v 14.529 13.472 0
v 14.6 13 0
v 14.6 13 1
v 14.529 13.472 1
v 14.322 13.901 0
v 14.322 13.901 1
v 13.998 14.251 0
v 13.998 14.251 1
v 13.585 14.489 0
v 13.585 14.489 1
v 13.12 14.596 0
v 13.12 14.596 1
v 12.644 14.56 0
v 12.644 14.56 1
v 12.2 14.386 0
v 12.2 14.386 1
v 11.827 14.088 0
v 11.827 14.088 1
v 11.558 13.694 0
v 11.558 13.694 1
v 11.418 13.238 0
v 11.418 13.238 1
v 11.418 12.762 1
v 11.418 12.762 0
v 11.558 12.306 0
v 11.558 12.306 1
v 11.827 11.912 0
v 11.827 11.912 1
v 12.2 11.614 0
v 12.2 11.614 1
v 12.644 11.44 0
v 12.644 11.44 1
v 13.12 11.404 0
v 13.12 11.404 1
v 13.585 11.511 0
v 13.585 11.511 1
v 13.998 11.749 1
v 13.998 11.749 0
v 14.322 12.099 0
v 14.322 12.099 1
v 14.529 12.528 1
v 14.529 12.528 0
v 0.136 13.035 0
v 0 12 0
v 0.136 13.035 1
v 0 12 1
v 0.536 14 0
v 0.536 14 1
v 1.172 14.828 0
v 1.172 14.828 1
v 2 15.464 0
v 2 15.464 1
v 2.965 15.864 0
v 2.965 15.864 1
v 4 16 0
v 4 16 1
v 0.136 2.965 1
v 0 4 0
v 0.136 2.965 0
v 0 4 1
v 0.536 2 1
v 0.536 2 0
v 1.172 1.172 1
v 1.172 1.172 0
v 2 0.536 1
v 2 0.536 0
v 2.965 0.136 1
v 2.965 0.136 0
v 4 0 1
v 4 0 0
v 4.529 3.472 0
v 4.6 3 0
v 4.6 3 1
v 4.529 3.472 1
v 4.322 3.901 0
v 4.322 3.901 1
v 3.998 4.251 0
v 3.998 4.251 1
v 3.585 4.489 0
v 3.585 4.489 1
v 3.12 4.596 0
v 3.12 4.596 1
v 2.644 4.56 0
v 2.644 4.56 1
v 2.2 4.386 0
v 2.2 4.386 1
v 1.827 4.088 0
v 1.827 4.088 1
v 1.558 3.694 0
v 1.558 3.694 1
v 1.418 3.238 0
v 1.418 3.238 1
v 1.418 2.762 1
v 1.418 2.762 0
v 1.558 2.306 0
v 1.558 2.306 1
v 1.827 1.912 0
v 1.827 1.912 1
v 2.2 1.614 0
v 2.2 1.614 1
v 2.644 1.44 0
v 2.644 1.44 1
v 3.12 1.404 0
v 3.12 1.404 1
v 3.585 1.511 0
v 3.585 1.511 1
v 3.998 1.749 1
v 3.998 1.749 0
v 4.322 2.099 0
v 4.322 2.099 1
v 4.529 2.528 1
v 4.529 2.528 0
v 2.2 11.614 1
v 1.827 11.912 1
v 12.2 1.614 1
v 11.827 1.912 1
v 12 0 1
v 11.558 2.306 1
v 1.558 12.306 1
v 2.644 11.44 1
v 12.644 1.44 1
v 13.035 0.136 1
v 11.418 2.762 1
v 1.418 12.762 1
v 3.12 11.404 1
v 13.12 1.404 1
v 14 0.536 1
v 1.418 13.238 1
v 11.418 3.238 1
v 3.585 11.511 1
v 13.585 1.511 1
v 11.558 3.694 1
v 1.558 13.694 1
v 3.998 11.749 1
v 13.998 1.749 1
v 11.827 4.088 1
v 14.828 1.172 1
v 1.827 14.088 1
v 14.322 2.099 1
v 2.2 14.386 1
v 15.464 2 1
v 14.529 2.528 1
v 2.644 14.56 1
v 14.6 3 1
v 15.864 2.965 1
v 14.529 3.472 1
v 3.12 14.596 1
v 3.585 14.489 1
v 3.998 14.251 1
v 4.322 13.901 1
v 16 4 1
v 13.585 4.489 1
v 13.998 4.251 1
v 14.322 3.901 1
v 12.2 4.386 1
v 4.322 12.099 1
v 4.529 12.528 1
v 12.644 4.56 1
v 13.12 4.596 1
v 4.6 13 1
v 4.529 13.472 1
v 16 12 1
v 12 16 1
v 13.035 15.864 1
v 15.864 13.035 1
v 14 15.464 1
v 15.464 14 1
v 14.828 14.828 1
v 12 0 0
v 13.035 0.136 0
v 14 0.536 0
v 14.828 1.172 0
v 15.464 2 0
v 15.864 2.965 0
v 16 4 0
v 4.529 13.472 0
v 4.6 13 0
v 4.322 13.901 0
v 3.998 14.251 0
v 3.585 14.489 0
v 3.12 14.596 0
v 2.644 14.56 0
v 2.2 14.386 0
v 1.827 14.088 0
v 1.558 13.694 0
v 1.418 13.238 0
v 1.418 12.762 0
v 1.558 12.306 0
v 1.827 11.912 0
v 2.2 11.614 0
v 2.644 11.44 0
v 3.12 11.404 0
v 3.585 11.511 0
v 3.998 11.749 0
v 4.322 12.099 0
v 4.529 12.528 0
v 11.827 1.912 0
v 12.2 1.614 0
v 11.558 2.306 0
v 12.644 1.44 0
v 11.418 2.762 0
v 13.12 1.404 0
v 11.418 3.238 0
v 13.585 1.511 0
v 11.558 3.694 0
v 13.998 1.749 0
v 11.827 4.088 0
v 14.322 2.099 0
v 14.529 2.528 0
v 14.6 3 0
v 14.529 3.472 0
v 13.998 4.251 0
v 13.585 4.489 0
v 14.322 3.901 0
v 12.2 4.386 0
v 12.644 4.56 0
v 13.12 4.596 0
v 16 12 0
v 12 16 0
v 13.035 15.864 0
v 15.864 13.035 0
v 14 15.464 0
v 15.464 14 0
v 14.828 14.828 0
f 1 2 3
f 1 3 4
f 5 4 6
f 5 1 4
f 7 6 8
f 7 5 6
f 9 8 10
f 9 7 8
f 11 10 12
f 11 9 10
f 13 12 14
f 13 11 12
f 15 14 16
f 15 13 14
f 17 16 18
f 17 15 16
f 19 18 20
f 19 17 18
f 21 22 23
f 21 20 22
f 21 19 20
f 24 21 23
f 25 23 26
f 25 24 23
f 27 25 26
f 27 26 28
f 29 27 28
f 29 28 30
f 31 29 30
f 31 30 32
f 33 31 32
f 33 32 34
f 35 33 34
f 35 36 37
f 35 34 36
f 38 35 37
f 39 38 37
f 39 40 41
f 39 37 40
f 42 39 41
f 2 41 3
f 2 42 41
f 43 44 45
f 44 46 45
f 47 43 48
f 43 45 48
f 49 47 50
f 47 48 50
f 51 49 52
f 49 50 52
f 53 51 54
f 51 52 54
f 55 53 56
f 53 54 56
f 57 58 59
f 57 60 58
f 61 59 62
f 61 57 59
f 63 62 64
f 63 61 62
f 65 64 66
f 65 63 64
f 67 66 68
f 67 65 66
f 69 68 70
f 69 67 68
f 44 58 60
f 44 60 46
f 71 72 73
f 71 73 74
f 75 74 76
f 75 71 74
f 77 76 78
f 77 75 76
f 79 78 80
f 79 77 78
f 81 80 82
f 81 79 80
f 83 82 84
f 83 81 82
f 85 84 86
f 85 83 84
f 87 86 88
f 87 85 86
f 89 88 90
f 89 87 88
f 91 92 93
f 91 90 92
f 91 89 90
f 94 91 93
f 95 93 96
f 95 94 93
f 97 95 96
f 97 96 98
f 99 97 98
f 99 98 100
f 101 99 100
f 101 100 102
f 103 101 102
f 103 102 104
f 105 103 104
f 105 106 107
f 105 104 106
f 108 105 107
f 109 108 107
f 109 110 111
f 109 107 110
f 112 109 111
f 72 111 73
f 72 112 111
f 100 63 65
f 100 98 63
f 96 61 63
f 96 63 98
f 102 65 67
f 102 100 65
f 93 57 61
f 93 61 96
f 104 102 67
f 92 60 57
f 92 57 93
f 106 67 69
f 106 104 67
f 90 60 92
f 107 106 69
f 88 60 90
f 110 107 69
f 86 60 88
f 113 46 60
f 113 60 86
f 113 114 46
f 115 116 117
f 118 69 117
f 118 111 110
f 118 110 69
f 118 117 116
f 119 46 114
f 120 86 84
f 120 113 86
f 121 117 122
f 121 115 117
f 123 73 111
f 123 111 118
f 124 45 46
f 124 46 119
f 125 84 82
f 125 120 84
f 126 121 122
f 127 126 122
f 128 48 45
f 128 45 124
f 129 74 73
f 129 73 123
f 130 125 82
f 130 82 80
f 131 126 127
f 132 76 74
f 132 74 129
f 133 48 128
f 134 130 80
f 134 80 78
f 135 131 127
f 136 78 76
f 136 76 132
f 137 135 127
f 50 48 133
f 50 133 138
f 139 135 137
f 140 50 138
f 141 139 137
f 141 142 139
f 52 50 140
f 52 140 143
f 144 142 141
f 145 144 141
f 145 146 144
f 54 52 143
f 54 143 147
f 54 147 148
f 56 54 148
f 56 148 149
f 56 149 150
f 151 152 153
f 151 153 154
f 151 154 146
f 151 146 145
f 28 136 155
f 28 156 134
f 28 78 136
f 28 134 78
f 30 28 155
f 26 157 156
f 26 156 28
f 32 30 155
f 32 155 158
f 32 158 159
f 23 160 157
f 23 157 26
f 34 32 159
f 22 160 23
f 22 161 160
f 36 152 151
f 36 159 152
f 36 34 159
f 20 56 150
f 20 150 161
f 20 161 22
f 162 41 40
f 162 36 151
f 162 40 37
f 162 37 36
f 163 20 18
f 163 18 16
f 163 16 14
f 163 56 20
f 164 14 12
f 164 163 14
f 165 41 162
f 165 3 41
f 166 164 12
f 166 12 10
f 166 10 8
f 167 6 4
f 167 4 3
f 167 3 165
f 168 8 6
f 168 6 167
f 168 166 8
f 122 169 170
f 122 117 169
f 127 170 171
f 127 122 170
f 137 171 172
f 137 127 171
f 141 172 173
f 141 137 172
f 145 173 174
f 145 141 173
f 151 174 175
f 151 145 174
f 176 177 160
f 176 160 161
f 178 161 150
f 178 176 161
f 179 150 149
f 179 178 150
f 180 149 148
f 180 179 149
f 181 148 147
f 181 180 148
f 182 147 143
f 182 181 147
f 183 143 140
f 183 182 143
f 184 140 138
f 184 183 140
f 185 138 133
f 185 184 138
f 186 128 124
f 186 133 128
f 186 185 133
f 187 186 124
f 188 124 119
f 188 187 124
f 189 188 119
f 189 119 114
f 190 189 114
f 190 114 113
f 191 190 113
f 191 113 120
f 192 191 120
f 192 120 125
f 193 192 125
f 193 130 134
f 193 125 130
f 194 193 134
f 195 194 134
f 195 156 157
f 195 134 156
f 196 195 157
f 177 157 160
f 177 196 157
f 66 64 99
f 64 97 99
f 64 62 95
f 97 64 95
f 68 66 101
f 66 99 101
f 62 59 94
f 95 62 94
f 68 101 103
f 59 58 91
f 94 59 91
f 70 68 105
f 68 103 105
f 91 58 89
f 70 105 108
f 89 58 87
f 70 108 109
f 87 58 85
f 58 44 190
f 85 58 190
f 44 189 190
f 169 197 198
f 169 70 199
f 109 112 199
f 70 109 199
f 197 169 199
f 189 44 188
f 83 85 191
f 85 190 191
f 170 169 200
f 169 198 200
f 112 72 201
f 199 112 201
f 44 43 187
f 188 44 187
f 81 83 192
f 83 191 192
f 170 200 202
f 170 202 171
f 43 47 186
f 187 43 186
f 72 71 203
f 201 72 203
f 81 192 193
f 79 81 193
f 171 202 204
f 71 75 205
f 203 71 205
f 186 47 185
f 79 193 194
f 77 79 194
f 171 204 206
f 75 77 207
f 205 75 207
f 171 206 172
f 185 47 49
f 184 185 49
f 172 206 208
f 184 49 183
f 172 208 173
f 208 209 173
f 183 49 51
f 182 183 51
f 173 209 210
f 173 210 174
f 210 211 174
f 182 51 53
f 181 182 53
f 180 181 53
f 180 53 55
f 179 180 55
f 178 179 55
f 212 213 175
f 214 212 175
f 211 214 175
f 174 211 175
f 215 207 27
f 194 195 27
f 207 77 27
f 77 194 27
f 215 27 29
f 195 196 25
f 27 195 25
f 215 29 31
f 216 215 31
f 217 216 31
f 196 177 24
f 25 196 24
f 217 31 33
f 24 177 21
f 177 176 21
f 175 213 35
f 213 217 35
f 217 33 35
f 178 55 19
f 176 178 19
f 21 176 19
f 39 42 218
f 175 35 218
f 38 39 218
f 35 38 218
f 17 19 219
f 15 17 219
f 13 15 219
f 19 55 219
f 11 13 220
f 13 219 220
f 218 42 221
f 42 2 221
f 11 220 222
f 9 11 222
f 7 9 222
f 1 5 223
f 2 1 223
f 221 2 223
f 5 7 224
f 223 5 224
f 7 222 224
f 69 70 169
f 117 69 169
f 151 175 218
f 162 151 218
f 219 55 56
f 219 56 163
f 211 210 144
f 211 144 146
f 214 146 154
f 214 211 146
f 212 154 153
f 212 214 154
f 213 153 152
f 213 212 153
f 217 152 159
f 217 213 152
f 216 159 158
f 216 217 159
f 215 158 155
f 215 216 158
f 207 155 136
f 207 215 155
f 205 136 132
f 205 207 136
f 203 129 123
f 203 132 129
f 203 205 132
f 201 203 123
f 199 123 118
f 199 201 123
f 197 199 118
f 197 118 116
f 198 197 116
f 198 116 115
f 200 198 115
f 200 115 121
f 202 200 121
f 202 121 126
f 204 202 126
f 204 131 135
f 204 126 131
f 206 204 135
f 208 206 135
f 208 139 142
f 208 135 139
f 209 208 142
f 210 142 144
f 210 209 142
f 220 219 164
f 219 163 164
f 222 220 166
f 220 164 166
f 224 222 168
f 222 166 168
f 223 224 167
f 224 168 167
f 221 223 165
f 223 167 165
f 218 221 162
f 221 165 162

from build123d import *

# Parameters (mm, degrees)
CYLINDER022_R       = 1.6
CYLINDER022_DEPTH   = 20
ARRAY001007_X_COUNT = 2
ARRAY001007_X_PITCH = 10
ARRAY001007_Y_COUNT = 2
ARRAY001007_Y_PITCH = 10
BOX008_W            = 16
BOX008_H            = 16
BOX008_DEPTH        = 1
FILLET003_R         = 4


with BuildPart() as rod_holder_hole_array001:
    # Cylinder022 → Cylinder022 (new body)
    with BuildSketch(Plane(origin=(3, 3, -6), x_dir=(1, 0, 0), z_dir=(0, 0, 1))):
        Circle(CYLINDER022_R)
    extrude(amount=CYLINDER022_DEPTH)

    # Array001007 X: rod holder hole array001 ×2


with BuildPart() as rod_holder_hole_array001_1:
    add(rod_holder_hole_array001.part)
    with Locations(*[(i * ARRAY001007_X_PITCH, 0, 0) for i in range(1, ARRAY001007_X_COUNT)]):
        add(rod_holder_hole_array001.part)

    # Array001007 Y: rod holder hole array001 ×2


with BuildPart() as rod_holder_hole_array001_2:
    add(rod_holder_hole_array001_1.part)
    with Locations(*[(0, i * ARRAY001007_Y_PITCH, 0) for i in range(1, ARRAY001007_Y_COUNT)]):
        add(rod_holder_hole_array001_1.part)


with BuildPart() as rod_cover_fillet:
    # Box008 → Box008 (new body)
    with BuildSketch(Plane.XY):
        with Locations((8, 8)):
            Rectangle(BOX008_W, BOX008_H)
    extrude(amount=BOX008_DEPTH)

    # Cut006: cut rod holder hole array001
    add(rod_holder_hole_array001_2.part, mode=Mode.SUBTRACT)

    # Fillet003
    fillet003_edges = [rod_cover_fillet.edges().sort_by_distance(p)[0] for p in [
        (0, 0, 0.5),
        (0, 16, 0.5),
        (16, 0, 0.5),
        (16, 16, 0.5),
    ]]
    fillet(fillet003_edges, radius=FILLET003_R)


solid = rod_cover_fillet.part
